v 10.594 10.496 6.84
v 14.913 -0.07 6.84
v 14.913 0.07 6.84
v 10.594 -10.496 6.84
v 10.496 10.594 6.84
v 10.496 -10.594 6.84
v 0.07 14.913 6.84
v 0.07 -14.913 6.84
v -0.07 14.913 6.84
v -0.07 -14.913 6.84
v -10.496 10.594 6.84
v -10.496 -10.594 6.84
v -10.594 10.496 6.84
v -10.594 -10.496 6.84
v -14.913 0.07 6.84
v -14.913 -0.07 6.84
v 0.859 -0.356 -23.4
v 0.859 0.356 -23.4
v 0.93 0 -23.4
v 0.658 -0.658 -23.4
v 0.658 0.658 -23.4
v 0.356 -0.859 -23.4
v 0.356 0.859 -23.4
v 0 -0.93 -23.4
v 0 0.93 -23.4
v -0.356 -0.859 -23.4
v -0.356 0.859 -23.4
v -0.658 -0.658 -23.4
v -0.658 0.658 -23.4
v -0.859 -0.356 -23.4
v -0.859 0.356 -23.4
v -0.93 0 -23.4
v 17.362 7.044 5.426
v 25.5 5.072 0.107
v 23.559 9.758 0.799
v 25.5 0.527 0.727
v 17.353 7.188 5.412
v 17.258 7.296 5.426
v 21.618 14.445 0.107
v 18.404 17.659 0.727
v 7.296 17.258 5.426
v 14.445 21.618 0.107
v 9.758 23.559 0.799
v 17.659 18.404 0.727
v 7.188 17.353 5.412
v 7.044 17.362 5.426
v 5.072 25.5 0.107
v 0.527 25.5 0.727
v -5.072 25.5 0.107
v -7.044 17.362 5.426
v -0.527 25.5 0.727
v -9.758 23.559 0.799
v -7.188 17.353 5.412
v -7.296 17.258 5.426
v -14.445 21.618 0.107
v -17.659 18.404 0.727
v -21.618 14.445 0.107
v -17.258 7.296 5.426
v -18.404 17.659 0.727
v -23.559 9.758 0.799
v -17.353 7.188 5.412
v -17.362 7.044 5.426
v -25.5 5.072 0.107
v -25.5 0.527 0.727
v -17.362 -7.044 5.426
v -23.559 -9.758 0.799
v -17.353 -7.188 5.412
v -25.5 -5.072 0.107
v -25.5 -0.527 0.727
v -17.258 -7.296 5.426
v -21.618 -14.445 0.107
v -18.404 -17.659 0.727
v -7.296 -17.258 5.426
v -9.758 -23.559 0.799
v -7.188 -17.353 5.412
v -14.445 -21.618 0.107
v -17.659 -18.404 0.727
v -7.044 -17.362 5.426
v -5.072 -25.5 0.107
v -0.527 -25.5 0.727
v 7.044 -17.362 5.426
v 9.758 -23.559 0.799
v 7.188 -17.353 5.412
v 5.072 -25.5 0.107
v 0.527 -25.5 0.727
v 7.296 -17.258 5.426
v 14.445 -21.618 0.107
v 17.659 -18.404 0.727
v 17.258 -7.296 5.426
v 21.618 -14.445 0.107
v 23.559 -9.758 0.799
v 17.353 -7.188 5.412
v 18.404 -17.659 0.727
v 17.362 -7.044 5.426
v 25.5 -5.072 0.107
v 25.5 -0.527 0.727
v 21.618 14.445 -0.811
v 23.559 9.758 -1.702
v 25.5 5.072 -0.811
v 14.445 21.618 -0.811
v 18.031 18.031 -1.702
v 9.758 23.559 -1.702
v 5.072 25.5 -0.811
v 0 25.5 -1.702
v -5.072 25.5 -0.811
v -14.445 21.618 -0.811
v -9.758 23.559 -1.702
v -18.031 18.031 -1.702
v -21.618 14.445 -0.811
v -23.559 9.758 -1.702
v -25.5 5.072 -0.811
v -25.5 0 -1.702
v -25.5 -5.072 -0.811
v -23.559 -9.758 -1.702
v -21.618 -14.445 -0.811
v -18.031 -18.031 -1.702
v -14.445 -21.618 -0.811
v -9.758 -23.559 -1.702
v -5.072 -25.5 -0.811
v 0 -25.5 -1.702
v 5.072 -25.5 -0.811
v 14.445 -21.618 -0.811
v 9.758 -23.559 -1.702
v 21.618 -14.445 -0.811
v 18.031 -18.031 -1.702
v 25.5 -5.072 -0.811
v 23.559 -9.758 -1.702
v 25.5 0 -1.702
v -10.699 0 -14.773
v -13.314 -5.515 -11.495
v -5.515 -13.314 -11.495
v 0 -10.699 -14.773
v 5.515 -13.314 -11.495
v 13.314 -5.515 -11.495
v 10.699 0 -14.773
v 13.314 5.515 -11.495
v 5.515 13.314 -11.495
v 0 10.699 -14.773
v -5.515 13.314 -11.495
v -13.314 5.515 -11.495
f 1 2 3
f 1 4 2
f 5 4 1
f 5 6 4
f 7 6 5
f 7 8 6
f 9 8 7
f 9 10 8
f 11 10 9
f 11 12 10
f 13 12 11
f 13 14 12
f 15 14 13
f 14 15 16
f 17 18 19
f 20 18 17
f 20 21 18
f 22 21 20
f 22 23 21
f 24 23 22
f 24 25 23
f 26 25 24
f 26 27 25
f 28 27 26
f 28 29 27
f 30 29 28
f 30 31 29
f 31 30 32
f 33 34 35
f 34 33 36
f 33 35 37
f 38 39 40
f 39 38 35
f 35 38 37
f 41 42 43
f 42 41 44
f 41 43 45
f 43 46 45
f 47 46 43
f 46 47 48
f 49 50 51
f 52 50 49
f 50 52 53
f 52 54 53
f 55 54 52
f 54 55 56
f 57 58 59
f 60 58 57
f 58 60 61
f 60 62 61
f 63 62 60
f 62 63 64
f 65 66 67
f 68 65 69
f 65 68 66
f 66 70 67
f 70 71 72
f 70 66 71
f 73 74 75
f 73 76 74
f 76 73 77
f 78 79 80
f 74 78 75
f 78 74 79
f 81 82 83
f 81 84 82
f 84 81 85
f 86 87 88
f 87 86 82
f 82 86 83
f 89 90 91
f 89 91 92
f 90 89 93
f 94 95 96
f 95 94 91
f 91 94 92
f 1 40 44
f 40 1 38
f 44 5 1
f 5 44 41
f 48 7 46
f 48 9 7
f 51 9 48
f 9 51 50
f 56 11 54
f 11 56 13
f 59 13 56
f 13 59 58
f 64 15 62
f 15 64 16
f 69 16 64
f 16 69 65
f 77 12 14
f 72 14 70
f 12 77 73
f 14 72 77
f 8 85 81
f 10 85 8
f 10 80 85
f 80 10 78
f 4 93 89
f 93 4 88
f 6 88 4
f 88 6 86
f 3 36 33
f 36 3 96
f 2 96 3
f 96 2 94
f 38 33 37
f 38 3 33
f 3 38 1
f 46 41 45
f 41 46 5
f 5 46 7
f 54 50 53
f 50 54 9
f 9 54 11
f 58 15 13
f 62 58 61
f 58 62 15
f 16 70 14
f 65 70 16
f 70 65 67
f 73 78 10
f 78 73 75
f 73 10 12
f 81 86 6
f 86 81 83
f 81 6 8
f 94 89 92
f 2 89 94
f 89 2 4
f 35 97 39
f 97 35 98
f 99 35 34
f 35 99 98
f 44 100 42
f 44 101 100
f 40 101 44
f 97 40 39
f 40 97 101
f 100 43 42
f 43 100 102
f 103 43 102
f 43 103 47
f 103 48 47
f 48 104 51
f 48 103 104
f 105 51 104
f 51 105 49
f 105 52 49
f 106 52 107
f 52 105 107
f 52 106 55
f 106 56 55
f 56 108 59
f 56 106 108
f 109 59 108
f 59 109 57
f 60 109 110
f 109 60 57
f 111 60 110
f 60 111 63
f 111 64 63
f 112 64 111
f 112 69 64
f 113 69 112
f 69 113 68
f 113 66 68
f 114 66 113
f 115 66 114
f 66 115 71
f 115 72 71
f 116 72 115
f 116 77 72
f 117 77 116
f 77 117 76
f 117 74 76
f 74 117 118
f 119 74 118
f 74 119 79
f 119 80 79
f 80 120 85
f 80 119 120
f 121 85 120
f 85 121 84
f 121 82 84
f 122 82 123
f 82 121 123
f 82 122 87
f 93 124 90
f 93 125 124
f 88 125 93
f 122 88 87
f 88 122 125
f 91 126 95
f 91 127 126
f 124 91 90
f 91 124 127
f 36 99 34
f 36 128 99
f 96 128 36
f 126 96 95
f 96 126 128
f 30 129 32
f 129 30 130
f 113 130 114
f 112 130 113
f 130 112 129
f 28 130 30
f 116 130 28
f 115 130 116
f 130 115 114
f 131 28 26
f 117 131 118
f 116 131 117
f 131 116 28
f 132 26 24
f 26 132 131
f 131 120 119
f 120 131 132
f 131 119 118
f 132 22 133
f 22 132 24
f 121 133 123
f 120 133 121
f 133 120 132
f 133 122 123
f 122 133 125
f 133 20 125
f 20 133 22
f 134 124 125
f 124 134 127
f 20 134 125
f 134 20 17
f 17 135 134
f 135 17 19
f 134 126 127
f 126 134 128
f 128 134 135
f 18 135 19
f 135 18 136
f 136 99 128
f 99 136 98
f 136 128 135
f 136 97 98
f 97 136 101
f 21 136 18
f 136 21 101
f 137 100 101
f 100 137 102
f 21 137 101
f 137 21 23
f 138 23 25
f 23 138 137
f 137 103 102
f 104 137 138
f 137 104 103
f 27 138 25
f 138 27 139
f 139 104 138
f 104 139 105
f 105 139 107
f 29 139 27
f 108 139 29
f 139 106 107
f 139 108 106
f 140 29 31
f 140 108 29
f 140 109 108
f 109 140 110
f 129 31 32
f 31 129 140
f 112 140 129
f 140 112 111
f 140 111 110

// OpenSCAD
/*
  create a brilliant cut diamond based on the guidance in 
     http://www.usfacetersguild.org/gem_designs/simple_brilliance/
  with an added culet to make a total of (1+16+8+8+16+1+16 )= 66 facets
  
  function make_facets() creates the data for each facet 
     (index_angle, axial_angle and height) 
  based on data in the design
  e.g.
     B 	35.00 	01-03-05-07-09-11-13-15-17-19-21-23-25-27-29-31
  translates to 
     make_facets(1,2,32,35)

  the distance from the centre of these facets is height and 
  this is set by experimentation to make the facets follow the pattern
  (I guess they could be computed but changing them by hand retains a 
   sense of the operation of a mechanical faceting machine)

  gem() then recursively creates each facet and removes it from 
  the remainder of  the original cube

  thanks to nop-head and the openscad forum

  Kit Wallace 
*/

function make_facets(start,increment,limit,axial_angle,height) =
    start <= limit
      ? concat([[start/limit*360, axial_angle, height]] ,
               make_facets(start+increment,increment,limit,axial_angle,height))
      : [] ;

module body(Size=100) {
    cube(Size,center=true);
}

module cut_facet_data(index_angle,axial_angle,height,Width=200,Depth=50) {
     rotate([0,0,index_angle])
        rotate([0,axial_angle,0])
           translate([0,0,Depth/2 + height])
              cube([Width,Width,Depth],center=true);
}

module cut_facets(facets, n) {
   for (i =[0:n-1]) 
       cut_facet(facets[i]);
}

module cut_facet(facet) {
   cut_facet_data(facet[0],facet[1],facet[2]);
}

module gem(facets,n) {
   difference() {
      if (n==1) body(); else gem(facets,n-1);
      cut_facet(facets[n-1]);
   }
}

function brilliant_facets() =
 concat( 
   make_facets(1,1,1,0,2.28),      // table
   make_facets(1,1,1,180,7.8),     // culet
   make_facets(1,2,32,35,5),       // B
   make_facets(4,4,32,30,4.46),    // M
   make_facets(2,4,32,16,3.46),    // S
   make_facets(2,2,32,90,8.5),     // girdle
   make_facets(1,2,32,42+180,6)    // C
 ); 

facets = brilliant_facets();
// echo (len(facets), facets);

scale(3) gem(facets,len(facets));
